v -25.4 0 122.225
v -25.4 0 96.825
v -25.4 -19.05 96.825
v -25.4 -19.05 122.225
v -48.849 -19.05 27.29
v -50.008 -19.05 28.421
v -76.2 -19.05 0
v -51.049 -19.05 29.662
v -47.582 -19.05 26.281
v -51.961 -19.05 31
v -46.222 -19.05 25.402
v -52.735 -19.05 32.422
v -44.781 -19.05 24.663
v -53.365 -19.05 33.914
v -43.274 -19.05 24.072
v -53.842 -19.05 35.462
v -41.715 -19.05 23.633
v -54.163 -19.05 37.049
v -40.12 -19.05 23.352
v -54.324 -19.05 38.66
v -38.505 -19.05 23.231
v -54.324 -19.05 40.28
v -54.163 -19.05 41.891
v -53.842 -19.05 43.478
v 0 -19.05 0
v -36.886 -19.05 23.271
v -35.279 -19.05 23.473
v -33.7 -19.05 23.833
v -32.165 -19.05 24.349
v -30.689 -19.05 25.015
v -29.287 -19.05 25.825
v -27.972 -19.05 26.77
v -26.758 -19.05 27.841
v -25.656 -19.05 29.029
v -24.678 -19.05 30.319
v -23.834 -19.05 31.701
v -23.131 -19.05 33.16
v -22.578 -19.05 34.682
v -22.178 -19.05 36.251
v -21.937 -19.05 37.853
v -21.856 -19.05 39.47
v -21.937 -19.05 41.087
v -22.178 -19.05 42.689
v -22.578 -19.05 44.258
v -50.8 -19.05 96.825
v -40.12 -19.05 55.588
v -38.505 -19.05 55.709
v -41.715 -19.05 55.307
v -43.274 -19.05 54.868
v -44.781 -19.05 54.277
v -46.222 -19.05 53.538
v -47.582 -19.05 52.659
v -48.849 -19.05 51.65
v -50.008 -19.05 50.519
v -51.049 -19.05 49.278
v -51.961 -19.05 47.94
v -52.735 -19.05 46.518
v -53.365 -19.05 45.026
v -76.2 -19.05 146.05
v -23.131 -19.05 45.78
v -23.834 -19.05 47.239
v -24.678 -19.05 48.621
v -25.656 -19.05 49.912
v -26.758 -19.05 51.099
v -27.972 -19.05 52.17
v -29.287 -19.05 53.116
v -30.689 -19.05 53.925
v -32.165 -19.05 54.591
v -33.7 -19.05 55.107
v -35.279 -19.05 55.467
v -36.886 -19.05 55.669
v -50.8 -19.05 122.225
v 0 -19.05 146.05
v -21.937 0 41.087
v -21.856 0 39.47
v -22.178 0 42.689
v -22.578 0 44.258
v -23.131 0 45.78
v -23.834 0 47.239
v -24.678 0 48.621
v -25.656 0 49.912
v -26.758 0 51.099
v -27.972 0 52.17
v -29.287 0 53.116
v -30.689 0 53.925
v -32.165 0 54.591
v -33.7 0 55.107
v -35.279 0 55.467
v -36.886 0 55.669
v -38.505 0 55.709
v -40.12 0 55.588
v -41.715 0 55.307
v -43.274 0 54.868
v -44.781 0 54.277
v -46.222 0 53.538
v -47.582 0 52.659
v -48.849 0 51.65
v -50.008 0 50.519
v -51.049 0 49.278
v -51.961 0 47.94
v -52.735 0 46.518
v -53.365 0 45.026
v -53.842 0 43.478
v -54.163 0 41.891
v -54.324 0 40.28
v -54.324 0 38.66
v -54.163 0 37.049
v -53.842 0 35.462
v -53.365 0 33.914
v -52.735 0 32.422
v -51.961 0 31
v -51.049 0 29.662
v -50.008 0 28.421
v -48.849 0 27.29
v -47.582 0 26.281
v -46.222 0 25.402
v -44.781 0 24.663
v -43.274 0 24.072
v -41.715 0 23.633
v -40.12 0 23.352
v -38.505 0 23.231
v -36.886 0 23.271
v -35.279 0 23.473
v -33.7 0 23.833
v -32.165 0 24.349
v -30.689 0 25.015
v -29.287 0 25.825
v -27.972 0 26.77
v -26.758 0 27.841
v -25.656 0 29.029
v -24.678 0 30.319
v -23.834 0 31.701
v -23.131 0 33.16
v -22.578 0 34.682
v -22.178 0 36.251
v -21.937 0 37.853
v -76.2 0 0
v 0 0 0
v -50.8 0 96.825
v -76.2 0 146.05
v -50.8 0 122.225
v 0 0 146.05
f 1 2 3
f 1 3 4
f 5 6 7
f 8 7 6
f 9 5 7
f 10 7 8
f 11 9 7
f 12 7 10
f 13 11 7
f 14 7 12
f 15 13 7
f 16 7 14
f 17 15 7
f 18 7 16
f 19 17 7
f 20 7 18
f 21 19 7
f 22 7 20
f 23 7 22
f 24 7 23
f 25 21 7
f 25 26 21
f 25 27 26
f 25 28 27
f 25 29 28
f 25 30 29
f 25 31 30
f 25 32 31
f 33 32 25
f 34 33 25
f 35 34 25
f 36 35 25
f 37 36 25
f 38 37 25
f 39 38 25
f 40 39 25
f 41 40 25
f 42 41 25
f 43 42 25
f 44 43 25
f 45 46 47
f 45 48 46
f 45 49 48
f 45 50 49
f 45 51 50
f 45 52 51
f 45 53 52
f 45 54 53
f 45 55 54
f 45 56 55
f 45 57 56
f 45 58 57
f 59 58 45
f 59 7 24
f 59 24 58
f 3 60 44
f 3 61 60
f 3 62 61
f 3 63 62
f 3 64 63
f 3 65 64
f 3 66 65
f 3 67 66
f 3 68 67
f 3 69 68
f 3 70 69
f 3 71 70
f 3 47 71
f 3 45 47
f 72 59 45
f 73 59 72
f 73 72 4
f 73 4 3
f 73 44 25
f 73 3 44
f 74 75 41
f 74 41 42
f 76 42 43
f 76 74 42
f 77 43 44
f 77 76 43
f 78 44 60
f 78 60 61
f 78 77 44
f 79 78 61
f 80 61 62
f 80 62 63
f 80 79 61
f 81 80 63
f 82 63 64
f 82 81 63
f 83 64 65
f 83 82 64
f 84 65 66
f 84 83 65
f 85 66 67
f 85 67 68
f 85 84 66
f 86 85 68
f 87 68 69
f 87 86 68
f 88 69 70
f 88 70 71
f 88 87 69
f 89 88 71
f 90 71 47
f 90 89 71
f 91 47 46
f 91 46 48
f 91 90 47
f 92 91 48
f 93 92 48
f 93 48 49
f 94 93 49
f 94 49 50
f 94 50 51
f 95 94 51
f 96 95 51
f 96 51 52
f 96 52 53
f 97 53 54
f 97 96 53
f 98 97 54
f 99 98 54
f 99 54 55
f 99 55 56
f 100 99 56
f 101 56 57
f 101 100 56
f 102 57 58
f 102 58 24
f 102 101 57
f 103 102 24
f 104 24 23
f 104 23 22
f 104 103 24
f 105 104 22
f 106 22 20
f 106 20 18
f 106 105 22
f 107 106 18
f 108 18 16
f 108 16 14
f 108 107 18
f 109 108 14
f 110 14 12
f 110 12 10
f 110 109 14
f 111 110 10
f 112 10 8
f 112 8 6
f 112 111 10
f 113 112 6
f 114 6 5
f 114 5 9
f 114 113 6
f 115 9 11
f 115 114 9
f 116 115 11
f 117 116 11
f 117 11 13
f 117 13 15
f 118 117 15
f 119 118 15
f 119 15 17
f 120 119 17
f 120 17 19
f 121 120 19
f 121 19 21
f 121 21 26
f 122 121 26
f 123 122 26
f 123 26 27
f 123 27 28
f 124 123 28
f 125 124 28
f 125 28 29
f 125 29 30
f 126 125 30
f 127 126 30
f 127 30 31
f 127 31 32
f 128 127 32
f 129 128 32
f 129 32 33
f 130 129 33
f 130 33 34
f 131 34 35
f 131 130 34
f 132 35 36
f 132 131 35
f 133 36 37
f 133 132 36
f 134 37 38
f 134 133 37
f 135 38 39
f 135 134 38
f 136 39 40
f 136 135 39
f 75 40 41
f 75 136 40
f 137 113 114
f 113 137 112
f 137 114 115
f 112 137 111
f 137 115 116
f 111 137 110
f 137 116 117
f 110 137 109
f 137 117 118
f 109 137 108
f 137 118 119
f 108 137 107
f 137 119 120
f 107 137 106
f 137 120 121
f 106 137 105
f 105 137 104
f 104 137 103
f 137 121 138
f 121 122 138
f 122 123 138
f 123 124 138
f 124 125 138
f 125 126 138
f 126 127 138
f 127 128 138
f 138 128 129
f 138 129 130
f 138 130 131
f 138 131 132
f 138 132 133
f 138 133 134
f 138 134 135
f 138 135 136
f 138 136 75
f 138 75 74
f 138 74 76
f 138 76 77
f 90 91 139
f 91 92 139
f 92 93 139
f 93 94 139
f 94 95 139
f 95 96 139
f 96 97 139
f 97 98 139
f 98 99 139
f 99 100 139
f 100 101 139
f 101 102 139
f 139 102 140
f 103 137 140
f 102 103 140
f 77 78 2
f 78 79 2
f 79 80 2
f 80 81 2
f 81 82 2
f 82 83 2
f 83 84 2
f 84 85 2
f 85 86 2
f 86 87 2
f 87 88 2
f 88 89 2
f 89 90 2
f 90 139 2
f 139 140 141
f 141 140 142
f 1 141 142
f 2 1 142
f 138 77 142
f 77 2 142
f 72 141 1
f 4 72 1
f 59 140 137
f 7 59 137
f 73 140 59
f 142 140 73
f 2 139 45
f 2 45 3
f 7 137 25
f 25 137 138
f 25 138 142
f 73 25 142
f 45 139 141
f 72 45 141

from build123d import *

# Parameters (mm, degrees)
F0_W     = 76.2
F0_H     = 75.435378
F0_R     = 16.244166
F0_H_2   = 70.614622
F0_W_2   = 25.4
F0_H_3   = 25.4
F1_DEPTH = 19.05


with BuildPart() as f1:
    # F0 (on Front) → F1 (new body)
    with BuildSketch(Plane.XZ):
        with Locations((-38.1, 37.717689)):
            Rectangle(F0_W, F0_H)
        with Locations((-38.1, 39.470069)):
            Circle(F0_R, mode=Mode.SUBTRACT)
        with Locations((-38.1, 110.742689)):
            Rectangle(F0_W, F0_H_2)
        with Locations((-38.1, 109.5248)):
            Rectangle(F0_W_2, F0_H_3, mode=Mode.SUBTRACT)
    extrude(amount=F1_DEPTH)


solid = f1.part
